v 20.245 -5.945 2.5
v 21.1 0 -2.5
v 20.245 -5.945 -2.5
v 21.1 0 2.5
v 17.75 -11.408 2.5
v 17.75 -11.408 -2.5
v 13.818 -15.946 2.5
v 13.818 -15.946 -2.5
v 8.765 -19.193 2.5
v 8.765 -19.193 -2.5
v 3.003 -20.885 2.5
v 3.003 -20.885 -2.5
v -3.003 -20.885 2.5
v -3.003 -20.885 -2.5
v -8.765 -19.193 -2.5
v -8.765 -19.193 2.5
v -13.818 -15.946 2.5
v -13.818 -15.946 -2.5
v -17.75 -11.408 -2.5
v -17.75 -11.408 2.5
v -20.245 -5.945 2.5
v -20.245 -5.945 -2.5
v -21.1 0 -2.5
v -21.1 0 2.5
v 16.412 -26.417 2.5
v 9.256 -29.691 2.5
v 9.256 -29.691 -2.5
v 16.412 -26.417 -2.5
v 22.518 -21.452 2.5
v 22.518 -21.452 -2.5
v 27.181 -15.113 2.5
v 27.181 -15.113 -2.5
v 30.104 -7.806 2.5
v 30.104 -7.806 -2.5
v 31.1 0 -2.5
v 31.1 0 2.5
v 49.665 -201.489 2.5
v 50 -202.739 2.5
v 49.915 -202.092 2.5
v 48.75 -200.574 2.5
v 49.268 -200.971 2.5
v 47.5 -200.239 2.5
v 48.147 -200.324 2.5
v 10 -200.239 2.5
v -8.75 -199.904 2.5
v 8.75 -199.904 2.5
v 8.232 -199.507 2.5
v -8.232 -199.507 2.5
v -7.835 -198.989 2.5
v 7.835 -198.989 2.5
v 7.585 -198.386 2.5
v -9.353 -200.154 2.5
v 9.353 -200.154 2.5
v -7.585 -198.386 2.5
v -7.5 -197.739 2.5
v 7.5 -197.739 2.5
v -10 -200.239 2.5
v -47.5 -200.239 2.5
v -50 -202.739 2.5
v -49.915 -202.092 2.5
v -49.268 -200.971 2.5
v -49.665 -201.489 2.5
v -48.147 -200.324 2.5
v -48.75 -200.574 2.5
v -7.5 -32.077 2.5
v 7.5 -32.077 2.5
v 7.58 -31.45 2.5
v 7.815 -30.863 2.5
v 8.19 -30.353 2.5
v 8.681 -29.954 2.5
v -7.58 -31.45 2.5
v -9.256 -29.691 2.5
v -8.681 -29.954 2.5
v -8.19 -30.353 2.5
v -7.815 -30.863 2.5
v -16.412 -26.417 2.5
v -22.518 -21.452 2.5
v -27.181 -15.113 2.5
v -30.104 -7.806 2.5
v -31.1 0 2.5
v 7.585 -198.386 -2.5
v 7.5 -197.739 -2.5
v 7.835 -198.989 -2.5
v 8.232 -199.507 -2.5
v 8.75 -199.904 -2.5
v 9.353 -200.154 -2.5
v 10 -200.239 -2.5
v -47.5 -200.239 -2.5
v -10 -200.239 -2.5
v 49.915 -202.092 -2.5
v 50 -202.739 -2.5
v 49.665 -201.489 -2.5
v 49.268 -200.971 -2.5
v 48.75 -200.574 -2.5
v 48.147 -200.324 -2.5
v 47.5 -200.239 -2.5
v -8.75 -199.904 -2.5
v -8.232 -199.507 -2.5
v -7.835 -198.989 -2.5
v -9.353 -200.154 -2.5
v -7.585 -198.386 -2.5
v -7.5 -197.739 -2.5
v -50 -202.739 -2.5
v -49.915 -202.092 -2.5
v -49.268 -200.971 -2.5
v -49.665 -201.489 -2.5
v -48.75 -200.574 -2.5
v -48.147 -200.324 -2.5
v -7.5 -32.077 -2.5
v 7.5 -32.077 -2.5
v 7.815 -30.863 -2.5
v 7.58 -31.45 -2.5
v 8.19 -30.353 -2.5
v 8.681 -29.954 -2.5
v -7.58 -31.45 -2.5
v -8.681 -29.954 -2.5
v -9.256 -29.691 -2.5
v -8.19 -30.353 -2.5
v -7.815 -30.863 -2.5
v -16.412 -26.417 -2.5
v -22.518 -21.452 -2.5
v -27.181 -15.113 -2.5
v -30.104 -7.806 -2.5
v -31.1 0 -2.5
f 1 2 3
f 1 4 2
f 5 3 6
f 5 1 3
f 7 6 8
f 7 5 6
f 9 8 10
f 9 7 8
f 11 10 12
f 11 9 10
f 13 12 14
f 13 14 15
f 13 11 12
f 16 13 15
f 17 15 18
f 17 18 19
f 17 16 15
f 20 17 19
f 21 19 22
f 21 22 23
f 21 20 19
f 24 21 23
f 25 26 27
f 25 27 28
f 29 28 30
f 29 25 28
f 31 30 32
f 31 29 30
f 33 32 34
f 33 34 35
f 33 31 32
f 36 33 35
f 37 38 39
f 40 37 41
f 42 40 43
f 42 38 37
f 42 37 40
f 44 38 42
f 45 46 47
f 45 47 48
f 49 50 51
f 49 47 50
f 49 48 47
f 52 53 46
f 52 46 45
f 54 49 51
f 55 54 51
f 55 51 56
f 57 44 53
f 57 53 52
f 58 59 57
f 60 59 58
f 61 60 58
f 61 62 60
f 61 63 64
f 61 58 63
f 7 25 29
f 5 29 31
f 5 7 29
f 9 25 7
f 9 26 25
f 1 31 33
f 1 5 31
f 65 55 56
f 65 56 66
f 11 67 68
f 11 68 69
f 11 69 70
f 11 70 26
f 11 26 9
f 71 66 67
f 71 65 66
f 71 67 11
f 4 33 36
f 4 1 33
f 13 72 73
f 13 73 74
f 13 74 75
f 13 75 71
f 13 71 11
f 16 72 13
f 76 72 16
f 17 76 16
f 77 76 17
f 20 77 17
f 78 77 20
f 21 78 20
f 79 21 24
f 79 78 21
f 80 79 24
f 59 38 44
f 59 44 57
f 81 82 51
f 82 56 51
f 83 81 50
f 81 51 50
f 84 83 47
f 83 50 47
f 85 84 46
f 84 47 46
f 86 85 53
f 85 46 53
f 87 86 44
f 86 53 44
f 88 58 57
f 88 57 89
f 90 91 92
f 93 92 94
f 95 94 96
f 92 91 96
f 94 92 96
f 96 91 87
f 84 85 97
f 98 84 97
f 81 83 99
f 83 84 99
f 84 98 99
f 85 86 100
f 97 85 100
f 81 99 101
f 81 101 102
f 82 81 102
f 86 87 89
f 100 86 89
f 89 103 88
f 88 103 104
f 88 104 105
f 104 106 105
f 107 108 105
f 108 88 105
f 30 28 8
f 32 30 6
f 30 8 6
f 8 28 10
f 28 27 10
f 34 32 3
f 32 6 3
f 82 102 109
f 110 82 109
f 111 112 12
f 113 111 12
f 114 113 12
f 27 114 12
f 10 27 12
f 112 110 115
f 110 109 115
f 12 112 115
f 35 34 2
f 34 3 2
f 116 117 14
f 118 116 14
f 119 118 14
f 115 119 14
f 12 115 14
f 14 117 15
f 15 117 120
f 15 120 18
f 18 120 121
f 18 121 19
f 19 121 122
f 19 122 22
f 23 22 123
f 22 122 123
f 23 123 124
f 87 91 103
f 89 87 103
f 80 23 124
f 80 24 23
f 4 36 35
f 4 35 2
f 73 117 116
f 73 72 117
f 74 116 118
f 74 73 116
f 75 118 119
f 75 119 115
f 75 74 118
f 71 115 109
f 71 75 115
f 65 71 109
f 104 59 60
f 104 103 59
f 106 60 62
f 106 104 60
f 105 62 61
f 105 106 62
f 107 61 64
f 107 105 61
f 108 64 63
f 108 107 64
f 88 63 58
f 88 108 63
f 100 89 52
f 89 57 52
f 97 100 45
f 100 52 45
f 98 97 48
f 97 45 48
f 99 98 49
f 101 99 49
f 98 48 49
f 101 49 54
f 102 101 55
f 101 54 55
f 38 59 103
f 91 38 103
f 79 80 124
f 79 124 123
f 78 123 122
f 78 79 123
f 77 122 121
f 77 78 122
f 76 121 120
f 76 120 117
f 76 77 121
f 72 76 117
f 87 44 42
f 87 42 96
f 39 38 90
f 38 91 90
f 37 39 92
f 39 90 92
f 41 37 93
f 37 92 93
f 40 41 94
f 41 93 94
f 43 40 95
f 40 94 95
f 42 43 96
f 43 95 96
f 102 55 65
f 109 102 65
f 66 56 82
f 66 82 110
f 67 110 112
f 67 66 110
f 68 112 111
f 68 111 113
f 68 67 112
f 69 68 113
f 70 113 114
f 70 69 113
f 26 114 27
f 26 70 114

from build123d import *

# Parameters (mm, degrees)
BOSS_EXTRUDE1_DEPTH      = 2.5
SKETCH3_W                = 15
SKETCH3_H                = 175
BOSS_EXTRUDE2_DEPTH      = 2.5
BOSS_EXTRUDE4_DEPTH      = 50
BOSS_EXTRUDE4_DEPTH_BACK = 50
SKETCH5_W                = 5
SKETCH5_H                = 2.5
FILLET1_R                = 2.5
FILLET2_R                = 2.5
FILLET3_R                = 2.5
FILLET4_R                = 2.5
FILLET5_R                = 2.5
FILLET6_R                = 2.5


with BuildPart() as part:
    # Sketch1 → Boss-Extrude1 (new, symmetric)
    with BuildSketch(Plane.XY):
        with BuildLine():
            Line((-21.1, 0), (-31.1, 0))
            ThreePointArc((-31.1, 0), (0, -31.1), (31.1, 0))
            Line((31.1, 0), (21.1, 0))
            ThreePointArc((21.1, 0), (0, -21.1), (-21.1, 0))
        make_face()
    extrude(amount=BOSS_EXTRUDE1_DEPTH, both=True)

    # Sketch3 → Boss-Extrude2 (add, symmetric)
    with BuildSketch(Plane.XY):
        with Locations((0, -115.239187588)):
            Rectangle(SKETCH3_W, SKETCH3_H)
    extrude(amount=BOSS_EXTRUDE2_DEPTH, both=True)

    # Sketch5 → Boss-Extrude4 (add, two sides: drawn at the far end of the back side and taken through both)
    with BuildSketch(Plane(origin=(0, 0, 0), x_dir=(0, 0, -1), z_dir=(1, 0, 0)).offset(-BOSS_EXTRUDE4_DEPTH_BACK)):
        with Locations((0, -201.489187588)):
            Rectangle(SKETCH5_W, SKETCH5_H)
    extrude(amount=BOSS_EXTRUDE4_DEPTH + BOSS_EXTRUDE4_DEPTH_BACK)

    # Fillet1
    fillet1_edges = [part.edges().sort_by_distance(p)[0] for p in [
        (7.5, -200.239187588, 0),
    ]]
    fillet(fillet1_edges, radius=FILLET1_R)

    # Fillet2
    fillet2_edges = [part.edges().sort_by_distance(p)[0] for p in [
        (-7.5, -200.239187588, 0),
    ]]
    fillet(fillet2_edges, radius=FILLET2_R)

    # Fillet3
    fillet3_edges = [part.edges().sort_by_distance(p)[0] for p in [
        (7.5, -30.182113909, 0),
    ]]
    fillet(fillet3_edges, radius=FILLET3_R)

    # Fillet4
    fillet4_edges = [part.edges().sort_by_distance(p)[0] for p in [
        (-7.5, -30.182113909, 0),
    ]]
    fillet(fillet4_edges, radius=FILLET4_R)

    # Fillet5
    fillet5_edges = [part.edges().sort_by_distance(p)[0] for p in [
        (50, -200.239187588, 0),
    ]]
    fillet(fillet5_edges, radius=FILLET5_R - 0.0001)  # a hair under: the kernel refuses the full size

    # Fillet6
    fillet6_edges = [part.edges().sort_by_distance(p)[0] for p in [
        (-50, -200.239187588, 0),
    ]]
    fillet(fillet6_edges, radius=FILLET6_R - 0.0001)  # a hair under: the kernel refuses the full size


solid = part.part
